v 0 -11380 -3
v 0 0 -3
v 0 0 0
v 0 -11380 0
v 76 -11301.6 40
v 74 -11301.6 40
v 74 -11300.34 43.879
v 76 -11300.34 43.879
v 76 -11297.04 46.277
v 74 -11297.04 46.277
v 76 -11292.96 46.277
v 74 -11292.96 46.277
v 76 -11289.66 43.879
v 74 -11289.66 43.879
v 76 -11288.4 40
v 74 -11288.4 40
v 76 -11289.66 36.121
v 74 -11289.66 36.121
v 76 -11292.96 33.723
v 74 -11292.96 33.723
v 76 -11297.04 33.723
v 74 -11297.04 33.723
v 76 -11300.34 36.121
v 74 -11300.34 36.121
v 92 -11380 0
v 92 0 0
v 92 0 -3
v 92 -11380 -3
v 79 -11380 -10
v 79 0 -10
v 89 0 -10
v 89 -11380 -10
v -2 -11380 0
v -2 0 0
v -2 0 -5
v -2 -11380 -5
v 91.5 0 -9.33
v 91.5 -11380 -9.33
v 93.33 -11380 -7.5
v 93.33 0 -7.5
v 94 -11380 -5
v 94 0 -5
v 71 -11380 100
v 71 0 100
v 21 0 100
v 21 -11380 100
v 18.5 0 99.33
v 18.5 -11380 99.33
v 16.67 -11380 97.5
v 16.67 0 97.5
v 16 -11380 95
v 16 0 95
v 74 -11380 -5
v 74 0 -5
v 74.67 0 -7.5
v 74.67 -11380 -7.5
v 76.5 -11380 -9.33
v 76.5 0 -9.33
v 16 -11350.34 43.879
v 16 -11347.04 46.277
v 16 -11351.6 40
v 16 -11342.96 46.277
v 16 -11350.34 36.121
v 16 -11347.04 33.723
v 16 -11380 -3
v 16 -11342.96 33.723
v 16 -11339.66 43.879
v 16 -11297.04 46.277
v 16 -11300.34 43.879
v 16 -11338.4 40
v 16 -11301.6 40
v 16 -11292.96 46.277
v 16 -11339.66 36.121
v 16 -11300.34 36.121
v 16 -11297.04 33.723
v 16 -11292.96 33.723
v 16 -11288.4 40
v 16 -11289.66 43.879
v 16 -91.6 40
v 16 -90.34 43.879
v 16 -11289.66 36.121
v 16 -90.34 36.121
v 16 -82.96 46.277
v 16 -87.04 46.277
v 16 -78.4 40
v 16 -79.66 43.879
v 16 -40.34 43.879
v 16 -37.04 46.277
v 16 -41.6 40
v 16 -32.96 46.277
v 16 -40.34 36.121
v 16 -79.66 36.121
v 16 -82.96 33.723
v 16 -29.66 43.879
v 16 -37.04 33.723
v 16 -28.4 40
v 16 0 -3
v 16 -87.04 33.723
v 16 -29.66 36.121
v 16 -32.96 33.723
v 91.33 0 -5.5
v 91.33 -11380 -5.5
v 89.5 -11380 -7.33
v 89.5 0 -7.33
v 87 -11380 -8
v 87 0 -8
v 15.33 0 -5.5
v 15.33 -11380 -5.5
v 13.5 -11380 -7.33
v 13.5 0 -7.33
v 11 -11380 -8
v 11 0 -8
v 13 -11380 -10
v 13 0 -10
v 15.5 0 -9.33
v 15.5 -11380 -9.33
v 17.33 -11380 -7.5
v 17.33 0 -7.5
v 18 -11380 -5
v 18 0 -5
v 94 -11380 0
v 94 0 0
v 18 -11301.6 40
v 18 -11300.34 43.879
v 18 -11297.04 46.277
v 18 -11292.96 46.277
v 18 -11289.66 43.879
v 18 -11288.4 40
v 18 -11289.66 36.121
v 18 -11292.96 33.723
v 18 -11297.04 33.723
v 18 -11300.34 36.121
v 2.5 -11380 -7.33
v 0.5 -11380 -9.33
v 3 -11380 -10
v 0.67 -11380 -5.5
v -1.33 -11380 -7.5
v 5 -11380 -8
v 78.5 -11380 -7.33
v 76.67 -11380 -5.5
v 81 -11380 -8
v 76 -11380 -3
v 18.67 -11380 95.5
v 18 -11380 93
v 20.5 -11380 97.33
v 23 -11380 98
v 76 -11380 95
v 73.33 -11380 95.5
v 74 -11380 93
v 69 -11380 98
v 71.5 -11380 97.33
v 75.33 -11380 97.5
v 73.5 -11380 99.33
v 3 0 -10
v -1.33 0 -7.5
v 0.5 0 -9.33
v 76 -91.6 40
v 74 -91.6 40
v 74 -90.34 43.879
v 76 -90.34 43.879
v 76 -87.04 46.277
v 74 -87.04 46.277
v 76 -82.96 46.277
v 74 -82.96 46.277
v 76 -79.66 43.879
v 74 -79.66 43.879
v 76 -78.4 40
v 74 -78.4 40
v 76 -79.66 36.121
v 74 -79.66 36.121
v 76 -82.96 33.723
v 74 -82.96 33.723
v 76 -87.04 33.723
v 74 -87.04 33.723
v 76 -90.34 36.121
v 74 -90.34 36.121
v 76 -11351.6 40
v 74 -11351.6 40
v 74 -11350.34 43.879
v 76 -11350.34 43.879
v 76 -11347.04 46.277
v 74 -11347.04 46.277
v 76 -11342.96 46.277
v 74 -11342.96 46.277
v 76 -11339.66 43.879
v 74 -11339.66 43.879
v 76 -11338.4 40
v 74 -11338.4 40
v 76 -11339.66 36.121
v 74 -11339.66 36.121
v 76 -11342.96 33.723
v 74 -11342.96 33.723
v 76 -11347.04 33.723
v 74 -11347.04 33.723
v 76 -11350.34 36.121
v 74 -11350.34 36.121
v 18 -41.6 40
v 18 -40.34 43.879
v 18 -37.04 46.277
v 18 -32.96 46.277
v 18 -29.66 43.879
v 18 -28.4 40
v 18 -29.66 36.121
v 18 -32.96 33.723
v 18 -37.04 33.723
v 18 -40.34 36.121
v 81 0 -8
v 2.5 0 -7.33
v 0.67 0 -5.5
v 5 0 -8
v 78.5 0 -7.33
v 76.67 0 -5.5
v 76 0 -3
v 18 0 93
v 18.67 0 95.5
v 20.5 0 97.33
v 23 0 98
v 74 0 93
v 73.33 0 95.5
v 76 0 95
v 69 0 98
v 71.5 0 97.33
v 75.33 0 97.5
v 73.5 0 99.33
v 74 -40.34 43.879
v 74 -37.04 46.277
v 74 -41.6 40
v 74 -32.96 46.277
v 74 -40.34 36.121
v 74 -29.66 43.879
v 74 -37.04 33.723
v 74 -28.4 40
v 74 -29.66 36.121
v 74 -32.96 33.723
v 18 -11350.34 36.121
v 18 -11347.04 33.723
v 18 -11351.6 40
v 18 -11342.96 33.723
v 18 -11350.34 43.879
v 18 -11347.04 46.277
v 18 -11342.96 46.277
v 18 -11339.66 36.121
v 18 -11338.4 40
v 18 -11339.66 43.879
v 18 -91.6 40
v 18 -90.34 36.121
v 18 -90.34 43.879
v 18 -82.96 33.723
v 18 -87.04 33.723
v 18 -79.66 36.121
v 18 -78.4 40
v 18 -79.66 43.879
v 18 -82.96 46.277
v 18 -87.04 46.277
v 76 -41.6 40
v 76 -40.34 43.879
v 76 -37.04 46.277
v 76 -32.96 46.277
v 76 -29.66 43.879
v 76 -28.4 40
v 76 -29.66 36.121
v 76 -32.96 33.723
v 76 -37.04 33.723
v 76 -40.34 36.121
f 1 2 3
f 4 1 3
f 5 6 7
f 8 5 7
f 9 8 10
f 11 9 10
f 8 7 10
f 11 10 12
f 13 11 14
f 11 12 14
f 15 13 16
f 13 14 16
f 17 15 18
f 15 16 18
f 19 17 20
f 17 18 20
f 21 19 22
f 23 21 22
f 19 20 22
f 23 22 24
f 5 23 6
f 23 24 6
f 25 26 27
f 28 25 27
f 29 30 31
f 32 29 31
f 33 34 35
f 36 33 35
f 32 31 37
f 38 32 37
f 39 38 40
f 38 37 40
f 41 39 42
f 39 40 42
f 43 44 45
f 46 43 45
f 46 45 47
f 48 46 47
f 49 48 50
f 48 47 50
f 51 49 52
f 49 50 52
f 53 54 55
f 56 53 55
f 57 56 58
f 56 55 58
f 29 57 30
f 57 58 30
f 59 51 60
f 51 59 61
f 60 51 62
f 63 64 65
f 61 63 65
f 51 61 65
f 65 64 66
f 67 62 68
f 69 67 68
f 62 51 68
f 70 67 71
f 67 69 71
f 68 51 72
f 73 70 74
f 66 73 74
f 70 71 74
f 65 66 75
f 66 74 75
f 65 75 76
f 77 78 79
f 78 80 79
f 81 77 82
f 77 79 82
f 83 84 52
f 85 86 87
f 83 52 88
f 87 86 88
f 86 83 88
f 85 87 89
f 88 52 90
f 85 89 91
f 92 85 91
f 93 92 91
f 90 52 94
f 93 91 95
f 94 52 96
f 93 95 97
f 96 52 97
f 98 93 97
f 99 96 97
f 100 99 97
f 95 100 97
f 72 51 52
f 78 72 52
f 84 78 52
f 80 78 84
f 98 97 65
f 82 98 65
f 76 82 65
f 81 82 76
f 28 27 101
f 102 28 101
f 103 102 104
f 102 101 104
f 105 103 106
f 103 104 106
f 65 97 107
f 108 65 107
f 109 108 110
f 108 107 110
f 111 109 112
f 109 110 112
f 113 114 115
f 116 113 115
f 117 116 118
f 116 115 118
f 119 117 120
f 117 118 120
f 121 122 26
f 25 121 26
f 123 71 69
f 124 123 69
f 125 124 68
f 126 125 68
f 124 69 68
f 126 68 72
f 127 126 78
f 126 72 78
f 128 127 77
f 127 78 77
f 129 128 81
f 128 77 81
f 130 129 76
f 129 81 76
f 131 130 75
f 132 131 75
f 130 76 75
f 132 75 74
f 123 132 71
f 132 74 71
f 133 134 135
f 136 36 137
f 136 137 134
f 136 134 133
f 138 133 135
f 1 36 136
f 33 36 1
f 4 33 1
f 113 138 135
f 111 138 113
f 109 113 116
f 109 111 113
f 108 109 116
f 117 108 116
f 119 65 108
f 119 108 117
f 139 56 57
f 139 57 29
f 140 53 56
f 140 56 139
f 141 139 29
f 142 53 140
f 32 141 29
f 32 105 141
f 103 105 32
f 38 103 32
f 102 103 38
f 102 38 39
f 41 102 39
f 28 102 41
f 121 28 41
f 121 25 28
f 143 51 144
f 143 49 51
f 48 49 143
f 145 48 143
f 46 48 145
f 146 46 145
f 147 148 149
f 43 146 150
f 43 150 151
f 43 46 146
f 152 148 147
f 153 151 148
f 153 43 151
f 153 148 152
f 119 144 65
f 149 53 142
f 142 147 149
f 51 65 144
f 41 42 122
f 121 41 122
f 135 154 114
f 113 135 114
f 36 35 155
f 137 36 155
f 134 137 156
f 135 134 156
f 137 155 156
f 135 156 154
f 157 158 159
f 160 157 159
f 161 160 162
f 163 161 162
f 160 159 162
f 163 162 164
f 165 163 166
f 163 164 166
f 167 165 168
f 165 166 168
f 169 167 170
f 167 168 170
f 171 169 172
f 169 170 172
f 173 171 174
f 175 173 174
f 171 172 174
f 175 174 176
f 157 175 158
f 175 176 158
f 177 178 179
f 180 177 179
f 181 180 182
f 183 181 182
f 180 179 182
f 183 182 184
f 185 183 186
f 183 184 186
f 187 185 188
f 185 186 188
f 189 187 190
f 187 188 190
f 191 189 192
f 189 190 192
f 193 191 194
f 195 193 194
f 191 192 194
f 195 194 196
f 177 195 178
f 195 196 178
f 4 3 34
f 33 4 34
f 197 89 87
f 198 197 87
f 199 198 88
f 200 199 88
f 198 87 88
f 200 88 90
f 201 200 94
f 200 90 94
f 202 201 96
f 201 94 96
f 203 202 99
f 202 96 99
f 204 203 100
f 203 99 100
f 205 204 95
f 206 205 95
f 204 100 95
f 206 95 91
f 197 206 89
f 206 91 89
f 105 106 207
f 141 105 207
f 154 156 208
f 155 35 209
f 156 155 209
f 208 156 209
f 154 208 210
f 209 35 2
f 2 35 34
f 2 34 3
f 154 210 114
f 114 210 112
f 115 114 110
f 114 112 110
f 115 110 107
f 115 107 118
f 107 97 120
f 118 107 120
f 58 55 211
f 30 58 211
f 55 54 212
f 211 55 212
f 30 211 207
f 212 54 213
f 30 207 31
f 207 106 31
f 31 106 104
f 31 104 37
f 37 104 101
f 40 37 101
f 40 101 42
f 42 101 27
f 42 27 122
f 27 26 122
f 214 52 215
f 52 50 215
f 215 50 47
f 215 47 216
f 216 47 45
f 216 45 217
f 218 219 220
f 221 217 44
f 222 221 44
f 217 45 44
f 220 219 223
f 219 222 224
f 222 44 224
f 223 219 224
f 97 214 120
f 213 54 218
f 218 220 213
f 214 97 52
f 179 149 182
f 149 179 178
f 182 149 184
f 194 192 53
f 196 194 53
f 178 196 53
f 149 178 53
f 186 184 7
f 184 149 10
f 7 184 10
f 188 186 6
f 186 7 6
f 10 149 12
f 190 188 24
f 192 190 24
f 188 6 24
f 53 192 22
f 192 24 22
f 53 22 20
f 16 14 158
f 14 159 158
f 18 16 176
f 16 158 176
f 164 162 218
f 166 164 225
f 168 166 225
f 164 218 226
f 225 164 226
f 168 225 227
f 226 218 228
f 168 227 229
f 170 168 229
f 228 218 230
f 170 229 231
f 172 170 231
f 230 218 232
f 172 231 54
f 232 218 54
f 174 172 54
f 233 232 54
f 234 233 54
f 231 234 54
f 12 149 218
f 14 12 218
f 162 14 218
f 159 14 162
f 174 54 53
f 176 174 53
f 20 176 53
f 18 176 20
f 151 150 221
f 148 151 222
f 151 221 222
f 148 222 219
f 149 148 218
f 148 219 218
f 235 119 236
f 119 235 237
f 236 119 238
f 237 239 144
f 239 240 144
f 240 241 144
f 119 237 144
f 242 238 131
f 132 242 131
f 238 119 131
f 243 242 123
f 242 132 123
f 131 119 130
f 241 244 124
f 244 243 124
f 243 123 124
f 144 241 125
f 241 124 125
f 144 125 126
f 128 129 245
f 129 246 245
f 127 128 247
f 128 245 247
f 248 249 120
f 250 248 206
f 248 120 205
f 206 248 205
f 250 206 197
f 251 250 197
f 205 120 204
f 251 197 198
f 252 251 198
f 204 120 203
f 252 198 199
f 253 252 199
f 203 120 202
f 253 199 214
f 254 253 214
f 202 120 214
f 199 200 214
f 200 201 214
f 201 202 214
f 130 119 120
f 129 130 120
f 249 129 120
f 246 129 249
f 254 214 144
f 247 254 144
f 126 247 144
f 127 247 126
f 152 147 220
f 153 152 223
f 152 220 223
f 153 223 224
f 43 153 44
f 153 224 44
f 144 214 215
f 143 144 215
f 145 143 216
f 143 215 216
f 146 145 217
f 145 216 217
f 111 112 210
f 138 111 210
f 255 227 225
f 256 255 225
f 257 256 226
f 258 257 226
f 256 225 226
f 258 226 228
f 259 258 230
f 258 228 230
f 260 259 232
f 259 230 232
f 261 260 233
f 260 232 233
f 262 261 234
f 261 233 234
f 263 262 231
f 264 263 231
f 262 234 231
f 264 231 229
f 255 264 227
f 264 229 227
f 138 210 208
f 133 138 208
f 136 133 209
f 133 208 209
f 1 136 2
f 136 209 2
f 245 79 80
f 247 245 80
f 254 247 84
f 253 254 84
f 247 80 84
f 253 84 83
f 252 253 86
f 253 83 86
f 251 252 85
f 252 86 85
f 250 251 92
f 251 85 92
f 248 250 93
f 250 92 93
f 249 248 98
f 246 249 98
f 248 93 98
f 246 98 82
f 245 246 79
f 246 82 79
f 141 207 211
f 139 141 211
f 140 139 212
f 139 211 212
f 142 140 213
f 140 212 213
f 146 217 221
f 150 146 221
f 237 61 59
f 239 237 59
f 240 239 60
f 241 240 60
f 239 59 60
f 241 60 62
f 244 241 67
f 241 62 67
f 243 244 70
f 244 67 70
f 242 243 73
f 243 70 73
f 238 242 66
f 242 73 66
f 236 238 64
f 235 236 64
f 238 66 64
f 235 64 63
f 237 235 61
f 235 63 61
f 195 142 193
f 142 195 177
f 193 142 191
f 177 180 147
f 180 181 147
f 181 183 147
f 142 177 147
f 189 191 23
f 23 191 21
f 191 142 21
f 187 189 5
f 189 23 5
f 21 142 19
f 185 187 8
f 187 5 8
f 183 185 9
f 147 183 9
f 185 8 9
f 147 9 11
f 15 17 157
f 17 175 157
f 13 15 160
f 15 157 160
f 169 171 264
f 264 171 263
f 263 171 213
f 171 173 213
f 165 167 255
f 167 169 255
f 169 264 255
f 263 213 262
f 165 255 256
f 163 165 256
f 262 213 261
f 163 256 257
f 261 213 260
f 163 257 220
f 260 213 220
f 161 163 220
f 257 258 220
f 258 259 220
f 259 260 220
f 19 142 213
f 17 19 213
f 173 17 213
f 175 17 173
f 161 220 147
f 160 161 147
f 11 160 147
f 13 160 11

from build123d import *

# Parameters (mm, degrees)
F1_DEPTH = 11380
F3_D     = 13.2


with BuildPart() as f1:
    # F0 (on Front) → F1 (new body)
    with BuildSketch(Plane.XZ):
        with BuildLine():
            Line((0, -3), (0, 0))
            Line((0, 0), (-2, 0))
            Line((-2, 0), (-2, -5))
            ThreePointArc((-2, -5), (-0.5355339059, -8.5355339059), (3, -10))
            Line((3, -10), (13, -10))
            ThreePointArc((13, -10), (16.5355339059, -8.5355339059), (18, -5))
            Line((18, -5), (18, 93))
            ThreePointArc((18, 93), (19.4644660941, 96.5355339059), (23, 98))
            Line((23, 98), (69, 98))
            ThreePointArc((69, 98), (72.5355339059, 96.5355339059), (74, 93))
            Line((74, 93), (74, -5))
            ThreePointArc((74, -5), (75.4644660941, -8.5355339059), (79, -10))
            Line((79, -10), (89, -10))
            ThreePointArc((89, -10), (92.5355339059, -8.5355339059), (94, -5))
            Line((94, -5), (94, 0))
            Line((94, 0), (92, 0))
            Line((92, 0), (92, -3))
            ThreePointArc((92, -3), (90.5355339059, -6.5355339059), (87, -8))
            Line((87, -8), (81, -8))
            ThreePointArc((81, -8), (77.4644660941, -6.5355339059), (76, -3))
            Line((76, -3), (76, 95))
            ThreePointArc((76, 95), (74.5355339059, 98.5355339059), (71, 100))
            Line((71, 100), (21, 100))
            ThreePointArc((21, 100), (17.4644660941, 98.5355339059), (16, 95))
            Line((16, 95), (16, -3))
            ThreePointArc((16, -3), (14.5355339059, -6.5355339059), (11, -8))
            Line((11, -8), (5, -8))
            ThreePointArc((5, -8), (1.4644660941, -6.5355339059), (0, -3))
        make_face()
    extrude(amount=F1_DEPTH)

    # F3 (through all)
    with Locations(Plane.YZ.offset(76)):
        with Locations((-11345, 40), (-11295, 40), (-85, 40), (-35, 40)):
            Hole(F3_D / 2)


solid = f1.part
